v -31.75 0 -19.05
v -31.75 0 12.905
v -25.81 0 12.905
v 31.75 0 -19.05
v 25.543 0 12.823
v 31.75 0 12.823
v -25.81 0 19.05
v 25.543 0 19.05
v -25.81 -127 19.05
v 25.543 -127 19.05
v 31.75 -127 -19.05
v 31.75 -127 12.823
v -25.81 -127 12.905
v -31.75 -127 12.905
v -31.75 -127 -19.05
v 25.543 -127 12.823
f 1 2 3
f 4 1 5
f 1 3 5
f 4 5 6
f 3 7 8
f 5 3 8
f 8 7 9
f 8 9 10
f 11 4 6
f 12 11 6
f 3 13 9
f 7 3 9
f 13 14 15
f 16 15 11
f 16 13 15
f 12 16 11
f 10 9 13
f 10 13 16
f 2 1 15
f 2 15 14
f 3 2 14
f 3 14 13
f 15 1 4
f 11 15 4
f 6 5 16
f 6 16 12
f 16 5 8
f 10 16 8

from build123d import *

# Parameters (mm, degrees)
F0_W     = 63.5
F0_H     = 38.1
F1_DEPTH = 127
F3_W     = 6.35
F3_H     = 6.35
F4_DEPTH = 127
F2_W     = 6.35
F2_H     = 6.35
F5_DEPTH = 127


with BuildPart() as f1:
    # F0 (on Front) → F1 (new body)
    with BuildSketch(Plane.XZ):
        Rectangle(F0_W, F0_H)
    extrude(amount=F1_DEPTH)

    # F3 (on Front) → F4 (cut)
    with BuildSketch(Plane.XZ):
        with Locations((-28.984677, 16.079839)):
            Rectangle(F3_W, F3_H)
    extrude(amount=F4_DEPTH, mode=Mode.SUBTRACT)

    # F2 (on Front) → F5 (cut)
    with BuildSketch(Plane.XZ):
        with Locations((28.718387, 15.997903)):
            Rectangle(F2_W, F2_H)
    extrude(amount=F5_DEPTH, mode=Mode.SUBTRACT)


solid = f1.part
